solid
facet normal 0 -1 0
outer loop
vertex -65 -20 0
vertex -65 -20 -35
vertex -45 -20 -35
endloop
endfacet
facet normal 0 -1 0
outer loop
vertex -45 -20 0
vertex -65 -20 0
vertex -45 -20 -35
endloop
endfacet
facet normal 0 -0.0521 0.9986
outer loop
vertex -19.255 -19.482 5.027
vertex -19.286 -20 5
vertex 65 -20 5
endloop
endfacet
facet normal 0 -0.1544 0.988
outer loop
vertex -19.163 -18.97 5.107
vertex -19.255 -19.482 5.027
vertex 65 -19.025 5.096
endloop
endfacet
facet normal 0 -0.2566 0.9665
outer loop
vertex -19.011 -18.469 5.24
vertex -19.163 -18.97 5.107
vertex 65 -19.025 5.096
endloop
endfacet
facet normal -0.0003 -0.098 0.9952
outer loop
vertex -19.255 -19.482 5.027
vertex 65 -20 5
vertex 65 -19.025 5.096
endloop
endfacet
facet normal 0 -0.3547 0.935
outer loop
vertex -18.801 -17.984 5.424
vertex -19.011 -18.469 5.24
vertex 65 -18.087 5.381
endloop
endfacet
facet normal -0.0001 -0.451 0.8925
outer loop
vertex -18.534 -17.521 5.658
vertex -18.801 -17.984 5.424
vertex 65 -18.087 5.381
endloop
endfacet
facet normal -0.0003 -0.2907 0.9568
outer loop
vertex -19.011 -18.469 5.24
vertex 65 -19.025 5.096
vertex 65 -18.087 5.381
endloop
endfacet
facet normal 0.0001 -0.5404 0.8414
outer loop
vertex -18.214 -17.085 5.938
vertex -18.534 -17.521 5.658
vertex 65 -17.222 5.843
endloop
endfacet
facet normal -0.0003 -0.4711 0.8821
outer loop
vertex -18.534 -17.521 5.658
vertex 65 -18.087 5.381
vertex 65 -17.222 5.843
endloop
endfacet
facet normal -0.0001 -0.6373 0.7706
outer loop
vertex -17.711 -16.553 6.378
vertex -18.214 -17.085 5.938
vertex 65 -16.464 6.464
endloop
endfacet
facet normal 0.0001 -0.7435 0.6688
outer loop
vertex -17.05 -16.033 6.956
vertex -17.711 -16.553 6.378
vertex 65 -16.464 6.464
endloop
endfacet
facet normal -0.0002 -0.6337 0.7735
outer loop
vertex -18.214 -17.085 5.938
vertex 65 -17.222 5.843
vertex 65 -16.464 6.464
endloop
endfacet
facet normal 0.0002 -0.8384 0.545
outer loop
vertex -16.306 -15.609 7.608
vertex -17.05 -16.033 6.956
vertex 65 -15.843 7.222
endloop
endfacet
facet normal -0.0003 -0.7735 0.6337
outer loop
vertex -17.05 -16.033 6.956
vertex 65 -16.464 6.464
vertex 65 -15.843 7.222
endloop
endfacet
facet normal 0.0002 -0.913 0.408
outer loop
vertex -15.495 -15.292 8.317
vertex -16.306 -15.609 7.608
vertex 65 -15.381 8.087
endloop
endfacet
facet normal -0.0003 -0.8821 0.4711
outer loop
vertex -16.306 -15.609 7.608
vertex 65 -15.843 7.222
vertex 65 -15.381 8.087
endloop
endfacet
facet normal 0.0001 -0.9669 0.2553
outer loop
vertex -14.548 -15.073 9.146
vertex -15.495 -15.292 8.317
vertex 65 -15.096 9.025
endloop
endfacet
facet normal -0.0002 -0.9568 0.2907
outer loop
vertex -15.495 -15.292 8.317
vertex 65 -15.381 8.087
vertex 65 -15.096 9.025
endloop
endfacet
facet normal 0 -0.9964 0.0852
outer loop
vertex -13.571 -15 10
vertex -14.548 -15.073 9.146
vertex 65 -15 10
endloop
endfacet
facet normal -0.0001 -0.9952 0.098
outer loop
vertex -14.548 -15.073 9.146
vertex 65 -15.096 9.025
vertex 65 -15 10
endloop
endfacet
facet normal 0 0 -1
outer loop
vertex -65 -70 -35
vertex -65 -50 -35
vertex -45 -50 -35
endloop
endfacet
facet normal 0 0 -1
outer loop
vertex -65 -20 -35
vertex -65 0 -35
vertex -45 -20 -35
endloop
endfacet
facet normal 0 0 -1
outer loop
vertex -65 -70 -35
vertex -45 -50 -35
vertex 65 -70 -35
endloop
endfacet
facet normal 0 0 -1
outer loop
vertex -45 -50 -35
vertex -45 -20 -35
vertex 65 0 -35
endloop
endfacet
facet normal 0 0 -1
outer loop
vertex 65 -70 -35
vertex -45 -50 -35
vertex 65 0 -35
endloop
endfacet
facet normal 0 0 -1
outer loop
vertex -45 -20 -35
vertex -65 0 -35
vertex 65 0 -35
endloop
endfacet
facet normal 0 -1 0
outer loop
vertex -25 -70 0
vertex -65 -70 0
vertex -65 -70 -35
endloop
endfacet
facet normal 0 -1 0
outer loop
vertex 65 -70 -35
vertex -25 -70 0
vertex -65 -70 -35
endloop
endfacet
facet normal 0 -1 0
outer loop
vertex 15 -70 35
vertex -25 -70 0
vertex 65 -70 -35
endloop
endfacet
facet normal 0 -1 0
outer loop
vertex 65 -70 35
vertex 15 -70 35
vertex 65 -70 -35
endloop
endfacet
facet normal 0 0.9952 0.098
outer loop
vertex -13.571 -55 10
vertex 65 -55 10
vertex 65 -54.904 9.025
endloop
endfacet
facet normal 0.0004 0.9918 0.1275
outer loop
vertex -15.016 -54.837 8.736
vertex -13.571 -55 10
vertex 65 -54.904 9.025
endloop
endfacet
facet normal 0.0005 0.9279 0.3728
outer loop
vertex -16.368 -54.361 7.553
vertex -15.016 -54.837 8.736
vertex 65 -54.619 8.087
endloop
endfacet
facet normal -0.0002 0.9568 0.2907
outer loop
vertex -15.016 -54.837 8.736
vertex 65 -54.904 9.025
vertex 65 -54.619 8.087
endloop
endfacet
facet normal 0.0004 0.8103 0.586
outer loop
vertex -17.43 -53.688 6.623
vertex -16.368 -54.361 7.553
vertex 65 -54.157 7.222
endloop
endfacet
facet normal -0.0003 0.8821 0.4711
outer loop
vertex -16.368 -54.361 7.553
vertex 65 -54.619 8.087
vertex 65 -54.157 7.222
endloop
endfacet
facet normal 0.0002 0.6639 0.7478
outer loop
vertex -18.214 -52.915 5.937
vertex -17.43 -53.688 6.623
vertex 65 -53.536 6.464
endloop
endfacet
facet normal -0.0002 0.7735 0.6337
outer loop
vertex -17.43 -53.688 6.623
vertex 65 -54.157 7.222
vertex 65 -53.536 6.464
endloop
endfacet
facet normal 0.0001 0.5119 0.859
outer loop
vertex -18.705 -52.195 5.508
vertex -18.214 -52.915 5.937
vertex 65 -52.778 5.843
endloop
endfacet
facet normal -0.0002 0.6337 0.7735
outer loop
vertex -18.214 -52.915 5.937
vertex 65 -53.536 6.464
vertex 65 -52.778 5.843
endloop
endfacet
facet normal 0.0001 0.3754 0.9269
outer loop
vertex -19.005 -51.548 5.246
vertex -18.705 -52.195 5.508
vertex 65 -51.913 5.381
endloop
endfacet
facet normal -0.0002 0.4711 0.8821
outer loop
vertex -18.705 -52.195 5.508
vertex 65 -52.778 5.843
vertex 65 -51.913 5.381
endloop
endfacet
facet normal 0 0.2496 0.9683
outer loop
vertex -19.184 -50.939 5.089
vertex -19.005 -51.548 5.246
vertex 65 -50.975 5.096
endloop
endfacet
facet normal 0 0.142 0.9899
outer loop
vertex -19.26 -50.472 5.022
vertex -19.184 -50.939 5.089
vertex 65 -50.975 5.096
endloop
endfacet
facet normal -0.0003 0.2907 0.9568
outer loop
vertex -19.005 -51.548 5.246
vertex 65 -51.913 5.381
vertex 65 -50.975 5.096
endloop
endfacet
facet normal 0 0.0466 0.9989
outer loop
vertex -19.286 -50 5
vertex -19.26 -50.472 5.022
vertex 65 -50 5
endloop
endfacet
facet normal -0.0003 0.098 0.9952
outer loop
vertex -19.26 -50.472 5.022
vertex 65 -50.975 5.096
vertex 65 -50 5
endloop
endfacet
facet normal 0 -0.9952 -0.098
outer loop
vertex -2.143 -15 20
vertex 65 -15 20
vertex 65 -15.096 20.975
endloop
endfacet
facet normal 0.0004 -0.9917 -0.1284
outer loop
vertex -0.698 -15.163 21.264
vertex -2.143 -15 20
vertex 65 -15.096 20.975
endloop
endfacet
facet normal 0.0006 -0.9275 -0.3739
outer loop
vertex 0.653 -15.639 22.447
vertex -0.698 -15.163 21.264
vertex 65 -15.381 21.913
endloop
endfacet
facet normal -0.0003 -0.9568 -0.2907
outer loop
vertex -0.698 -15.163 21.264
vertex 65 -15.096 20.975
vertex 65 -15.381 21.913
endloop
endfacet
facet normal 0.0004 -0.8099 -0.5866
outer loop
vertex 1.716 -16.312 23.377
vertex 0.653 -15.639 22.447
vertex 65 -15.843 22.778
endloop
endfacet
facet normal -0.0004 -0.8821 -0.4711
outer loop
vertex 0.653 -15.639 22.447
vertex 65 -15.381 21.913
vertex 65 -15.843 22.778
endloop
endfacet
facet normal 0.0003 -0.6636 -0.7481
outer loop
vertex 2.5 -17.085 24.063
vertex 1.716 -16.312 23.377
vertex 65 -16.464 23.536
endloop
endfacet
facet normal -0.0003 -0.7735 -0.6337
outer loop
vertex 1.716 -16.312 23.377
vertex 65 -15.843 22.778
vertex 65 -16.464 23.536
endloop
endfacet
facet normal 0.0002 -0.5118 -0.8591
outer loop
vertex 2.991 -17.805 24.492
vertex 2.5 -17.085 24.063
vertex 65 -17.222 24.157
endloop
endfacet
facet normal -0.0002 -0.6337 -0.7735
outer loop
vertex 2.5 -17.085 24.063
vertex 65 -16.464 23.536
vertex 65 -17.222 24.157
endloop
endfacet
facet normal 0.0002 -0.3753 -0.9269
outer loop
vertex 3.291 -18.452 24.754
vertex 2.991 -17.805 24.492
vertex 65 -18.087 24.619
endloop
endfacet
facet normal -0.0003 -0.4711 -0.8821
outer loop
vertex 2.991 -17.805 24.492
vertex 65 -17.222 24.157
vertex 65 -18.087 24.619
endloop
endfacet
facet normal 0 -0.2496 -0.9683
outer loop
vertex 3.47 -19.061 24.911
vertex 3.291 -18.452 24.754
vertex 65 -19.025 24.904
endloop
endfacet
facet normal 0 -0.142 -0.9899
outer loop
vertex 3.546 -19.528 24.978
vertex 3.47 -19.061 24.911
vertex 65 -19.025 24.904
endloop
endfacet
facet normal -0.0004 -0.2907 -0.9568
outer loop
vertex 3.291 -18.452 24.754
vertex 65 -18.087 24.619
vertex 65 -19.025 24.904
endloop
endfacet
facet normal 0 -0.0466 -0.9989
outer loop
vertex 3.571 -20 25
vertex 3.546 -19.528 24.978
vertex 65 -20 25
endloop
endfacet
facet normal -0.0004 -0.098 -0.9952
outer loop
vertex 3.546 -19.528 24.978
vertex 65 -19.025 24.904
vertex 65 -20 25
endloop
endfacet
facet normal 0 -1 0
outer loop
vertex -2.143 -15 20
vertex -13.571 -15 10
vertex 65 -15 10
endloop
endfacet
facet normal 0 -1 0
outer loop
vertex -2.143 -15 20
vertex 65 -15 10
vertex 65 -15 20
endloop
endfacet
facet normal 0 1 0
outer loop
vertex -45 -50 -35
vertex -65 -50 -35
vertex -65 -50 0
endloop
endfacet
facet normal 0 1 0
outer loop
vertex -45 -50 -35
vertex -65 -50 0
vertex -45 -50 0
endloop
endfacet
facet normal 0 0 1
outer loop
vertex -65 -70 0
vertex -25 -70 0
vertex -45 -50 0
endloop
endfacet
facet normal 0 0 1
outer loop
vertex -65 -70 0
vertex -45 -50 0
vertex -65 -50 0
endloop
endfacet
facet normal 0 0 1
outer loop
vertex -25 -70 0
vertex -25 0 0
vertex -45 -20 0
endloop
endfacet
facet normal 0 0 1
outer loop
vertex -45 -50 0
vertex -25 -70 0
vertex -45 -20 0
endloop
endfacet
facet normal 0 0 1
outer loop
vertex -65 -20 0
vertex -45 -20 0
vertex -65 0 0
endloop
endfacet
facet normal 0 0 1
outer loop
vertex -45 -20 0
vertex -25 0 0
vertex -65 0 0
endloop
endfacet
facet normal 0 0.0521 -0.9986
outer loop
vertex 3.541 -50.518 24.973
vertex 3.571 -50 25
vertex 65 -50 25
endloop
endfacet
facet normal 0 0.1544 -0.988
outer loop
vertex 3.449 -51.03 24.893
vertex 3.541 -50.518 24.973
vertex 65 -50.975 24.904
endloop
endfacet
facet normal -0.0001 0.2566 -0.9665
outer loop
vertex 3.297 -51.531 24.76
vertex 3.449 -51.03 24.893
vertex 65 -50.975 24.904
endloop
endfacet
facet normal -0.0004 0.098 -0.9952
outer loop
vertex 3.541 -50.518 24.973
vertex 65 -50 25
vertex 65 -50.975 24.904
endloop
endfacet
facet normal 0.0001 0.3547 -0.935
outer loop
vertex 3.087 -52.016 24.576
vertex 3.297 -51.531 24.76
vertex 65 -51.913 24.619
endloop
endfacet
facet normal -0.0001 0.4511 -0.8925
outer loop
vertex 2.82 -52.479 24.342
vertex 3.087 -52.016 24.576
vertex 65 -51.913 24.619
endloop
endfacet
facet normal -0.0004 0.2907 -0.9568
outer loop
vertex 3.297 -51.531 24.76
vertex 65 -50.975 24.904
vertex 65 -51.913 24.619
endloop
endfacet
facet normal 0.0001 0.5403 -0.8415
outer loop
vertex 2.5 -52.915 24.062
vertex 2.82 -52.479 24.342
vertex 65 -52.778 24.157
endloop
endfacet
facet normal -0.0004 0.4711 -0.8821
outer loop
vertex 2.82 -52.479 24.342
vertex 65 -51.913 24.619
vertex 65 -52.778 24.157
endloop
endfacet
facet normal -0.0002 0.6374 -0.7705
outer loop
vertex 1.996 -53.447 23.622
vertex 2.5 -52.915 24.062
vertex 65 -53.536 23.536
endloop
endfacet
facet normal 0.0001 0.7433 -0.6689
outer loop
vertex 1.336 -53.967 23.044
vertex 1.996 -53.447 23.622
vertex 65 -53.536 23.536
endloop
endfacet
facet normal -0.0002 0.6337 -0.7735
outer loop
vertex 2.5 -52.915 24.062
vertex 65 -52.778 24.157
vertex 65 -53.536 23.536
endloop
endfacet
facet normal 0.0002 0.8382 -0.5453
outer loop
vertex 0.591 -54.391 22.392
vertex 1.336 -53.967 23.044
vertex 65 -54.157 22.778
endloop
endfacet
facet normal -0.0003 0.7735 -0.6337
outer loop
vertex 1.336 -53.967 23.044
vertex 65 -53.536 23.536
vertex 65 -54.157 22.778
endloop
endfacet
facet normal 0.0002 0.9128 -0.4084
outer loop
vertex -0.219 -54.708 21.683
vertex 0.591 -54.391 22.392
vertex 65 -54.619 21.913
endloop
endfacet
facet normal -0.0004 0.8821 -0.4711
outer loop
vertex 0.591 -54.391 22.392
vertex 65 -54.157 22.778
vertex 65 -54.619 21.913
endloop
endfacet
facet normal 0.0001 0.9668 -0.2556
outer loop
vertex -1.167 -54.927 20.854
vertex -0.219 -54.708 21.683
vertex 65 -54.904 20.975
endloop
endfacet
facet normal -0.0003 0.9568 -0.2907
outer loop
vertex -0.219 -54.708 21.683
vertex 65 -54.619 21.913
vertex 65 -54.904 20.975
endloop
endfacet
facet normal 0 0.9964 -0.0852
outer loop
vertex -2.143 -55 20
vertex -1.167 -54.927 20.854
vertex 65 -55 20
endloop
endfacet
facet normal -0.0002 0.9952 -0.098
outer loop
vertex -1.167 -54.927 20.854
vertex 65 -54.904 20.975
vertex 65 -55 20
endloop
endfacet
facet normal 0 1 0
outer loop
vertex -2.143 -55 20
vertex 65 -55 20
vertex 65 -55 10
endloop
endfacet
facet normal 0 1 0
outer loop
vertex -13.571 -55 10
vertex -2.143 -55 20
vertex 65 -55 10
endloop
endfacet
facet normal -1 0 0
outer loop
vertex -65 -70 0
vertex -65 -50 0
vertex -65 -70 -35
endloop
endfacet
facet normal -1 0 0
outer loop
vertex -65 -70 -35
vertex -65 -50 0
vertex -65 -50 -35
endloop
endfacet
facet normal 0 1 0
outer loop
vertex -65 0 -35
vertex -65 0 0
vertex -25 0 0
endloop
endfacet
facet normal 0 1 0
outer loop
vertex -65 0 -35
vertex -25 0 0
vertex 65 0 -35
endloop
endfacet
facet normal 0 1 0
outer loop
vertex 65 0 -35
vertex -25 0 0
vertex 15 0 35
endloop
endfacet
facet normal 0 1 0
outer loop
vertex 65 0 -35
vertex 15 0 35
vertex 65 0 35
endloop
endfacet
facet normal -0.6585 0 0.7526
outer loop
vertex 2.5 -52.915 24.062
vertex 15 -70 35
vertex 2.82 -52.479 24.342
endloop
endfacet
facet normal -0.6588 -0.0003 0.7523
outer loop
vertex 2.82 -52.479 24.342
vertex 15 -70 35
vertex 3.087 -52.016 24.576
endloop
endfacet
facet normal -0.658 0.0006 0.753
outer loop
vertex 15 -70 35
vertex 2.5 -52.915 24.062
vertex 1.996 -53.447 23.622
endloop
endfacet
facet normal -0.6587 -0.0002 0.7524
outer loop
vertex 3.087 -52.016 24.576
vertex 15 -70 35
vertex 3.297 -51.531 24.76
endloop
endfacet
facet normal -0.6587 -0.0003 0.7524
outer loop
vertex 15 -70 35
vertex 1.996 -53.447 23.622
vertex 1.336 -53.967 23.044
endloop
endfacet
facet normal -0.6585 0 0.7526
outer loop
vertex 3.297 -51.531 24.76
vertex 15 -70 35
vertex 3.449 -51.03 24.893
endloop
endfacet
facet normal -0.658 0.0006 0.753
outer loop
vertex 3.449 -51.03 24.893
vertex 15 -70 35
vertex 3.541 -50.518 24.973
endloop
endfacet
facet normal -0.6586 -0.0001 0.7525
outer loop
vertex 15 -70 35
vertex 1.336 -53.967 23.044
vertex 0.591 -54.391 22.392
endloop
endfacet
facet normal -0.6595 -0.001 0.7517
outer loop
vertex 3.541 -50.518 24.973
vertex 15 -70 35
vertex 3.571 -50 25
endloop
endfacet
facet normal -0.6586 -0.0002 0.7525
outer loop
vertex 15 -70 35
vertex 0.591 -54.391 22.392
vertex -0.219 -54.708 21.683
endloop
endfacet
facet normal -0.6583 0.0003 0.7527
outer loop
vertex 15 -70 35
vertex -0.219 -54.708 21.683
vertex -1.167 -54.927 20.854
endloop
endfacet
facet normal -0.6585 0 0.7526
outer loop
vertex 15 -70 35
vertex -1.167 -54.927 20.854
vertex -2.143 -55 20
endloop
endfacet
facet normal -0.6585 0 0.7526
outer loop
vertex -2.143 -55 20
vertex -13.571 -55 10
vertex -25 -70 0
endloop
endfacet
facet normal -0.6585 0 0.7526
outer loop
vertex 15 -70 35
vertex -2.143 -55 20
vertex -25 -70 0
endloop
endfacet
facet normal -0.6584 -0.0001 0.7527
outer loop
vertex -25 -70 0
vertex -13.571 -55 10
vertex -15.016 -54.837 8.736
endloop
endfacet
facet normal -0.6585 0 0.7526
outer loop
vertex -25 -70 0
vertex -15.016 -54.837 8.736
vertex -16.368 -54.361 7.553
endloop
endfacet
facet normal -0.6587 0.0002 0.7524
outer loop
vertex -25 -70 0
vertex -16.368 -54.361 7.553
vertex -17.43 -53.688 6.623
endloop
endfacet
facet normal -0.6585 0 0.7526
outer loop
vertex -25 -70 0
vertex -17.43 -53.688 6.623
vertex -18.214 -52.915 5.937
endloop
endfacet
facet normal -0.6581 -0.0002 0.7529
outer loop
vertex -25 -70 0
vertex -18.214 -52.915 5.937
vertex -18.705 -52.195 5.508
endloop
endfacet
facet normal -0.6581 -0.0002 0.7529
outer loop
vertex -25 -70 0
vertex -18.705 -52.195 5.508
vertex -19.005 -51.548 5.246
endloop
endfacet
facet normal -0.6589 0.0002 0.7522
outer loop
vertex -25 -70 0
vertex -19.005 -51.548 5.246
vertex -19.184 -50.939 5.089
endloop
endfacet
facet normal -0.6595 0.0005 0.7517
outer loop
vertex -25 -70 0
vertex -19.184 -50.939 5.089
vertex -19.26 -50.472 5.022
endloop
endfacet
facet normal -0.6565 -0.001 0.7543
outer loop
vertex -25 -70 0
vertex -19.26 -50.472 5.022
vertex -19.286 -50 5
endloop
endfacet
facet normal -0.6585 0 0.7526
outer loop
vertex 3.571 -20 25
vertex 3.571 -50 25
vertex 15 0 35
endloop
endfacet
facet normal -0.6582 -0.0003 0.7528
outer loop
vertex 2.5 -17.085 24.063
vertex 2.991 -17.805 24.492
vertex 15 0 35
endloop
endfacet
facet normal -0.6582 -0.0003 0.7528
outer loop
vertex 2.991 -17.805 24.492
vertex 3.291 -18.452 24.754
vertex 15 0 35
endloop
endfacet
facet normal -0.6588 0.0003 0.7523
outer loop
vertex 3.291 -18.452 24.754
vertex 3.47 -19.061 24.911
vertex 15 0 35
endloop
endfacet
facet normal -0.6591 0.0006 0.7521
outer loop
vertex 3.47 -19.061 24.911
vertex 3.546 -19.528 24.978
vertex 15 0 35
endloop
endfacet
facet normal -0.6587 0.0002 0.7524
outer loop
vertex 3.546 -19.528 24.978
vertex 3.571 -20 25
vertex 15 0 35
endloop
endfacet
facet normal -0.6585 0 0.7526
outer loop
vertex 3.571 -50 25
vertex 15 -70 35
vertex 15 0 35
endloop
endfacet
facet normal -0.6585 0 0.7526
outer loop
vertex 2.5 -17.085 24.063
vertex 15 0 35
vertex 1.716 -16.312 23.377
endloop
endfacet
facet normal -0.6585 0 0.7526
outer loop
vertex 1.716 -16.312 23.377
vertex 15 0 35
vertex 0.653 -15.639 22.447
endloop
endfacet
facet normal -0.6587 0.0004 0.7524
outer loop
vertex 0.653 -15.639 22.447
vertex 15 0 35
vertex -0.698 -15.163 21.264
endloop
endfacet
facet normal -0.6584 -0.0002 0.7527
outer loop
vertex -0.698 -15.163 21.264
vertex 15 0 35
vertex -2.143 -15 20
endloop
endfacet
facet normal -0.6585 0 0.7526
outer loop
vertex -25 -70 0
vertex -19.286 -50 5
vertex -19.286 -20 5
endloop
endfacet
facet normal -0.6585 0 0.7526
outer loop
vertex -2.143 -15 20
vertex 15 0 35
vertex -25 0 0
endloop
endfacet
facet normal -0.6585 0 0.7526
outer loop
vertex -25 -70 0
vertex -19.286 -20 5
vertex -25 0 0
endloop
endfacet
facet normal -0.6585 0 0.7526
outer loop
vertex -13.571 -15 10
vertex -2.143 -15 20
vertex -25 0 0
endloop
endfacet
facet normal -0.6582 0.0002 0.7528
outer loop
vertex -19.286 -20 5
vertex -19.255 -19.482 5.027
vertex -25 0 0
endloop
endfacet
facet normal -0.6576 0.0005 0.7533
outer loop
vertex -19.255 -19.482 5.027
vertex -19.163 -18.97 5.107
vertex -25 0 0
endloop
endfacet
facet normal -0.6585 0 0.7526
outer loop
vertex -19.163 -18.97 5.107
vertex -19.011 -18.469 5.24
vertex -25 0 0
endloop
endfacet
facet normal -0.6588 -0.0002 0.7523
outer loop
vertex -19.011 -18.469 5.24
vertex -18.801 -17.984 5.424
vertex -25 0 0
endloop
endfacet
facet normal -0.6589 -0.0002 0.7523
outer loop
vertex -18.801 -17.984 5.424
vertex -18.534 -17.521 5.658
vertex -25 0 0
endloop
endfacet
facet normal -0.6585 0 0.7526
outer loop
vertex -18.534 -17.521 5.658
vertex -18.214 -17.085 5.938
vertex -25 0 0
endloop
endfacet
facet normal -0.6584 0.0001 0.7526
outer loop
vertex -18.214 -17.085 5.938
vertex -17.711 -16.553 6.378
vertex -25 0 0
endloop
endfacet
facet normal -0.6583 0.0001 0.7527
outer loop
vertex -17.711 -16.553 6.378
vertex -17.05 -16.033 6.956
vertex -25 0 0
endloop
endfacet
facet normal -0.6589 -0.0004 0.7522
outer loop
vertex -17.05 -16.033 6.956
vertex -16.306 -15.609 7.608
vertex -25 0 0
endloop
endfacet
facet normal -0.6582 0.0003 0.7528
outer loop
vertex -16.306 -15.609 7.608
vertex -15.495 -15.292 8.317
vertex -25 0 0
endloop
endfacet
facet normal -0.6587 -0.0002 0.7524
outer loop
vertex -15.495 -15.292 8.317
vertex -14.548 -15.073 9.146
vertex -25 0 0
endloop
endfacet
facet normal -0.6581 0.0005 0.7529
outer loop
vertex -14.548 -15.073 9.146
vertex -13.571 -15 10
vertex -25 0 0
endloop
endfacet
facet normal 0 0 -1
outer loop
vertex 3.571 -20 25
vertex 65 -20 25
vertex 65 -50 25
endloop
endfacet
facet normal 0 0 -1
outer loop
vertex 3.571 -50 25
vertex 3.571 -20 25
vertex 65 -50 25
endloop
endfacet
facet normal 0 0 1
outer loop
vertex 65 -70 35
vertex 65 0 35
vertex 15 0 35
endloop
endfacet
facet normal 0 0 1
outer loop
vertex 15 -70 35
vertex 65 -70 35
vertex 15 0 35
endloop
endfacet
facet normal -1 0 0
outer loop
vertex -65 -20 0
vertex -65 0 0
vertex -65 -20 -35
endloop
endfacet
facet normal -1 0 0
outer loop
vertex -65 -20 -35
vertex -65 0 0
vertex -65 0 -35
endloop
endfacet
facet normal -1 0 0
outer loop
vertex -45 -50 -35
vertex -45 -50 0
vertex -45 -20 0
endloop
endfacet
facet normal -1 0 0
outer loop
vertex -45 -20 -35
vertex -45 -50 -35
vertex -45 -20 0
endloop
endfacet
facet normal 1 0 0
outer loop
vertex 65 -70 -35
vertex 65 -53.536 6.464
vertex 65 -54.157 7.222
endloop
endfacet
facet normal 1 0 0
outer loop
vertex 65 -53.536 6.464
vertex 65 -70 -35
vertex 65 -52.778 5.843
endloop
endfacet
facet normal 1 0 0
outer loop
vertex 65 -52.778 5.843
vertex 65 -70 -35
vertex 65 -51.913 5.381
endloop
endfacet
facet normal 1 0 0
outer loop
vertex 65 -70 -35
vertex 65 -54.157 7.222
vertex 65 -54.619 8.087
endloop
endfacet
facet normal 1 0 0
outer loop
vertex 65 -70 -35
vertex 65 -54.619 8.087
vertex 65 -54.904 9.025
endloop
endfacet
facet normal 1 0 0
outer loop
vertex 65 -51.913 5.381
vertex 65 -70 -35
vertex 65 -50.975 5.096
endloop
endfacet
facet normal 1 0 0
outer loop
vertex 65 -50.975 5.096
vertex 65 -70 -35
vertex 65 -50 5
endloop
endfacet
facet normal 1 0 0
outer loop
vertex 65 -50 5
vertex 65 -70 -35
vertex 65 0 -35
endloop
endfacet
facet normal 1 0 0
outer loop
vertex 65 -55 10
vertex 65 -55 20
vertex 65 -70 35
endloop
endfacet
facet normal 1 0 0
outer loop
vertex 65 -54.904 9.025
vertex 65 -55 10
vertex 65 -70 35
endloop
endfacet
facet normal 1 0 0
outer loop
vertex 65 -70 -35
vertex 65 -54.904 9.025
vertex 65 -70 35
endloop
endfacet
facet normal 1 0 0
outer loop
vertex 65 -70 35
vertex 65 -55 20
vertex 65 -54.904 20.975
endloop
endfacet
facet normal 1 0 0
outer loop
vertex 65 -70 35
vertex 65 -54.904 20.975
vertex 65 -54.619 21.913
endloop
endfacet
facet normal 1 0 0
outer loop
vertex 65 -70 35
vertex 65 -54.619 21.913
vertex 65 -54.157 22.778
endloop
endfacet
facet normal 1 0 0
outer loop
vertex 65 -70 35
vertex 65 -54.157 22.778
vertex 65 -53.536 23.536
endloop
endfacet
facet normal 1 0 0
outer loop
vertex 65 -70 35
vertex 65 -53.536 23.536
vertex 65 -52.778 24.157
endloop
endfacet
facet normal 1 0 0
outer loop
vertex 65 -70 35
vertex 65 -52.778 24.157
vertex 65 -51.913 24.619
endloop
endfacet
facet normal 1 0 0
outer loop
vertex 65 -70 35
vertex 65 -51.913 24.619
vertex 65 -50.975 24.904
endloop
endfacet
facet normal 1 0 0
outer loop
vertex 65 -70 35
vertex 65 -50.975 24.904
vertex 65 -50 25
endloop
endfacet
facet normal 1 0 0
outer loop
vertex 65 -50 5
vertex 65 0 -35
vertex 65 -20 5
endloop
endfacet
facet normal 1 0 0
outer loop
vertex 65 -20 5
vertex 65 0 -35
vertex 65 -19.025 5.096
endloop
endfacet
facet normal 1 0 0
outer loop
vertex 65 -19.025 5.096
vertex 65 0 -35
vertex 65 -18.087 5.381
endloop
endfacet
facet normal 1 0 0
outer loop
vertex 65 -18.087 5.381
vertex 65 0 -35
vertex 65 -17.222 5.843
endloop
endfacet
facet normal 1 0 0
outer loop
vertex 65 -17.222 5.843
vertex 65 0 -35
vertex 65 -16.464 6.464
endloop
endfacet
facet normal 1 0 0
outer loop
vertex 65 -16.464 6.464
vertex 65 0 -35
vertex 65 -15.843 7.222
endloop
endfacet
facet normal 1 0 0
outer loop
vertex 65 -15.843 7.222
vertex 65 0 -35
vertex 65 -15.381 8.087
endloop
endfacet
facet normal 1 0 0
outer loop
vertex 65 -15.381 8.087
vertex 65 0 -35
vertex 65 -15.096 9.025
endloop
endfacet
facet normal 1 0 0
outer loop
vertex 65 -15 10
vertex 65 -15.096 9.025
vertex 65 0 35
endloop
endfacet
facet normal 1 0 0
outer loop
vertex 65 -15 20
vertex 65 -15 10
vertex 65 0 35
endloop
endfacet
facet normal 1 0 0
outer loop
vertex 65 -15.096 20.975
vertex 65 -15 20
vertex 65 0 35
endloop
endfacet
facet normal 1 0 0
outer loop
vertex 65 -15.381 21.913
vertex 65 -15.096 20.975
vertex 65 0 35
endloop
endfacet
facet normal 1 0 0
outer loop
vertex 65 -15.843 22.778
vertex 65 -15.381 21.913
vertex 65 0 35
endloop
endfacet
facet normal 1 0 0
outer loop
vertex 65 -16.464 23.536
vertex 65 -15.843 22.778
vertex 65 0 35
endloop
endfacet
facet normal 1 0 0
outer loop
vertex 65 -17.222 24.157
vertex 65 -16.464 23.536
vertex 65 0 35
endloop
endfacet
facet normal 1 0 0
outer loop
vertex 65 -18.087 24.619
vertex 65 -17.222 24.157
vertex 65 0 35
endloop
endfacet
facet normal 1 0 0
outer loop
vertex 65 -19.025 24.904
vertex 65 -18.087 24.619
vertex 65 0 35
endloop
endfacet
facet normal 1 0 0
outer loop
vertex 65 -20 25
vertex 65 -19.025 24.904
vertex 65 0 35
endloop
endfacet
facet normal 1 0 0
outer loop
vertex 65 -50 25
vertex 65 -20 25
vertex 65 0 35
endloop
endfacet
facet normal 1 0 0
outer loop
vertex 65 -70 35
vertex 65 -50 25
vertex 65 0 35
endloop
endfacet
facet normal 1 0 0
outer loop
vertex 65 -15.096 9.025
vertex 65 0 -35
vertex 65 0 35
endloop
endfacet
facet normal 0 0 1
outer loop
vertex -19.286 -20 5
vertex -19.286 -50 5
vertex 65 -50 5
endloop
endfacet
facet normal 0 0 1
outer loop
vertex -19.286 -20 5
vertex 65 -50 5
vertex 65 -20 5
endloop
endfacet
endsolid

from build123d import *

# Parameters (mm, degrees)
F1_DEPTH = 70
F2_W     = 20
F2_H     = 30
F3_DEPTH = 35.001
F5_DEPTH = 130.001


with BuildPart() as f1:
    # F0 (on Front) → F1 (new body)
    with BuildSketch(Plane.XZ):
        Polygon((-65, 0), (-65, -35), (65, -35), (65, 35), (15, 35), (-25, 0), align=None)
    extrude(amount=F1_DEPTH)

    # F2 (on face) → F3 (cut, through all)
    with BuildSketch(Plane.XY):
        with Locations((-55, -35)):
            Rectangle(F2_W, F2_H)
    extrude(amount=-F3_DEPTH, mode=Mode.SUBTRACT)

    # F4 (on face) → F5 (cut, through all)
    with BuildSketch(Plane.YZ.offset(65)):
        with BuildLine():
            ThreePointArc((-55, 10), (-53.535534, 6.464466), (-50, 5))
            Line((-50, 5), (-20, 5))
            ThreePointArc((-20, 5), (-16.464466, 6.464466), (-15, 10))
            Line((-15, 10), (-15, 20))
            ThreePointArc((-15, 20), (-16.464466, 23.535534), (-20, 25))
            Line((-20, 25), (-50, 25))
            ThreePointArc((-50, 25), (-53.535534, 23.535534), (-55, 20))
            Line((-55, 20), (-55, 10))
        make_face()
    extrude(amount=-F5_DEPTH, mode=Mode.SUBTRACT)


solid = f1.part
